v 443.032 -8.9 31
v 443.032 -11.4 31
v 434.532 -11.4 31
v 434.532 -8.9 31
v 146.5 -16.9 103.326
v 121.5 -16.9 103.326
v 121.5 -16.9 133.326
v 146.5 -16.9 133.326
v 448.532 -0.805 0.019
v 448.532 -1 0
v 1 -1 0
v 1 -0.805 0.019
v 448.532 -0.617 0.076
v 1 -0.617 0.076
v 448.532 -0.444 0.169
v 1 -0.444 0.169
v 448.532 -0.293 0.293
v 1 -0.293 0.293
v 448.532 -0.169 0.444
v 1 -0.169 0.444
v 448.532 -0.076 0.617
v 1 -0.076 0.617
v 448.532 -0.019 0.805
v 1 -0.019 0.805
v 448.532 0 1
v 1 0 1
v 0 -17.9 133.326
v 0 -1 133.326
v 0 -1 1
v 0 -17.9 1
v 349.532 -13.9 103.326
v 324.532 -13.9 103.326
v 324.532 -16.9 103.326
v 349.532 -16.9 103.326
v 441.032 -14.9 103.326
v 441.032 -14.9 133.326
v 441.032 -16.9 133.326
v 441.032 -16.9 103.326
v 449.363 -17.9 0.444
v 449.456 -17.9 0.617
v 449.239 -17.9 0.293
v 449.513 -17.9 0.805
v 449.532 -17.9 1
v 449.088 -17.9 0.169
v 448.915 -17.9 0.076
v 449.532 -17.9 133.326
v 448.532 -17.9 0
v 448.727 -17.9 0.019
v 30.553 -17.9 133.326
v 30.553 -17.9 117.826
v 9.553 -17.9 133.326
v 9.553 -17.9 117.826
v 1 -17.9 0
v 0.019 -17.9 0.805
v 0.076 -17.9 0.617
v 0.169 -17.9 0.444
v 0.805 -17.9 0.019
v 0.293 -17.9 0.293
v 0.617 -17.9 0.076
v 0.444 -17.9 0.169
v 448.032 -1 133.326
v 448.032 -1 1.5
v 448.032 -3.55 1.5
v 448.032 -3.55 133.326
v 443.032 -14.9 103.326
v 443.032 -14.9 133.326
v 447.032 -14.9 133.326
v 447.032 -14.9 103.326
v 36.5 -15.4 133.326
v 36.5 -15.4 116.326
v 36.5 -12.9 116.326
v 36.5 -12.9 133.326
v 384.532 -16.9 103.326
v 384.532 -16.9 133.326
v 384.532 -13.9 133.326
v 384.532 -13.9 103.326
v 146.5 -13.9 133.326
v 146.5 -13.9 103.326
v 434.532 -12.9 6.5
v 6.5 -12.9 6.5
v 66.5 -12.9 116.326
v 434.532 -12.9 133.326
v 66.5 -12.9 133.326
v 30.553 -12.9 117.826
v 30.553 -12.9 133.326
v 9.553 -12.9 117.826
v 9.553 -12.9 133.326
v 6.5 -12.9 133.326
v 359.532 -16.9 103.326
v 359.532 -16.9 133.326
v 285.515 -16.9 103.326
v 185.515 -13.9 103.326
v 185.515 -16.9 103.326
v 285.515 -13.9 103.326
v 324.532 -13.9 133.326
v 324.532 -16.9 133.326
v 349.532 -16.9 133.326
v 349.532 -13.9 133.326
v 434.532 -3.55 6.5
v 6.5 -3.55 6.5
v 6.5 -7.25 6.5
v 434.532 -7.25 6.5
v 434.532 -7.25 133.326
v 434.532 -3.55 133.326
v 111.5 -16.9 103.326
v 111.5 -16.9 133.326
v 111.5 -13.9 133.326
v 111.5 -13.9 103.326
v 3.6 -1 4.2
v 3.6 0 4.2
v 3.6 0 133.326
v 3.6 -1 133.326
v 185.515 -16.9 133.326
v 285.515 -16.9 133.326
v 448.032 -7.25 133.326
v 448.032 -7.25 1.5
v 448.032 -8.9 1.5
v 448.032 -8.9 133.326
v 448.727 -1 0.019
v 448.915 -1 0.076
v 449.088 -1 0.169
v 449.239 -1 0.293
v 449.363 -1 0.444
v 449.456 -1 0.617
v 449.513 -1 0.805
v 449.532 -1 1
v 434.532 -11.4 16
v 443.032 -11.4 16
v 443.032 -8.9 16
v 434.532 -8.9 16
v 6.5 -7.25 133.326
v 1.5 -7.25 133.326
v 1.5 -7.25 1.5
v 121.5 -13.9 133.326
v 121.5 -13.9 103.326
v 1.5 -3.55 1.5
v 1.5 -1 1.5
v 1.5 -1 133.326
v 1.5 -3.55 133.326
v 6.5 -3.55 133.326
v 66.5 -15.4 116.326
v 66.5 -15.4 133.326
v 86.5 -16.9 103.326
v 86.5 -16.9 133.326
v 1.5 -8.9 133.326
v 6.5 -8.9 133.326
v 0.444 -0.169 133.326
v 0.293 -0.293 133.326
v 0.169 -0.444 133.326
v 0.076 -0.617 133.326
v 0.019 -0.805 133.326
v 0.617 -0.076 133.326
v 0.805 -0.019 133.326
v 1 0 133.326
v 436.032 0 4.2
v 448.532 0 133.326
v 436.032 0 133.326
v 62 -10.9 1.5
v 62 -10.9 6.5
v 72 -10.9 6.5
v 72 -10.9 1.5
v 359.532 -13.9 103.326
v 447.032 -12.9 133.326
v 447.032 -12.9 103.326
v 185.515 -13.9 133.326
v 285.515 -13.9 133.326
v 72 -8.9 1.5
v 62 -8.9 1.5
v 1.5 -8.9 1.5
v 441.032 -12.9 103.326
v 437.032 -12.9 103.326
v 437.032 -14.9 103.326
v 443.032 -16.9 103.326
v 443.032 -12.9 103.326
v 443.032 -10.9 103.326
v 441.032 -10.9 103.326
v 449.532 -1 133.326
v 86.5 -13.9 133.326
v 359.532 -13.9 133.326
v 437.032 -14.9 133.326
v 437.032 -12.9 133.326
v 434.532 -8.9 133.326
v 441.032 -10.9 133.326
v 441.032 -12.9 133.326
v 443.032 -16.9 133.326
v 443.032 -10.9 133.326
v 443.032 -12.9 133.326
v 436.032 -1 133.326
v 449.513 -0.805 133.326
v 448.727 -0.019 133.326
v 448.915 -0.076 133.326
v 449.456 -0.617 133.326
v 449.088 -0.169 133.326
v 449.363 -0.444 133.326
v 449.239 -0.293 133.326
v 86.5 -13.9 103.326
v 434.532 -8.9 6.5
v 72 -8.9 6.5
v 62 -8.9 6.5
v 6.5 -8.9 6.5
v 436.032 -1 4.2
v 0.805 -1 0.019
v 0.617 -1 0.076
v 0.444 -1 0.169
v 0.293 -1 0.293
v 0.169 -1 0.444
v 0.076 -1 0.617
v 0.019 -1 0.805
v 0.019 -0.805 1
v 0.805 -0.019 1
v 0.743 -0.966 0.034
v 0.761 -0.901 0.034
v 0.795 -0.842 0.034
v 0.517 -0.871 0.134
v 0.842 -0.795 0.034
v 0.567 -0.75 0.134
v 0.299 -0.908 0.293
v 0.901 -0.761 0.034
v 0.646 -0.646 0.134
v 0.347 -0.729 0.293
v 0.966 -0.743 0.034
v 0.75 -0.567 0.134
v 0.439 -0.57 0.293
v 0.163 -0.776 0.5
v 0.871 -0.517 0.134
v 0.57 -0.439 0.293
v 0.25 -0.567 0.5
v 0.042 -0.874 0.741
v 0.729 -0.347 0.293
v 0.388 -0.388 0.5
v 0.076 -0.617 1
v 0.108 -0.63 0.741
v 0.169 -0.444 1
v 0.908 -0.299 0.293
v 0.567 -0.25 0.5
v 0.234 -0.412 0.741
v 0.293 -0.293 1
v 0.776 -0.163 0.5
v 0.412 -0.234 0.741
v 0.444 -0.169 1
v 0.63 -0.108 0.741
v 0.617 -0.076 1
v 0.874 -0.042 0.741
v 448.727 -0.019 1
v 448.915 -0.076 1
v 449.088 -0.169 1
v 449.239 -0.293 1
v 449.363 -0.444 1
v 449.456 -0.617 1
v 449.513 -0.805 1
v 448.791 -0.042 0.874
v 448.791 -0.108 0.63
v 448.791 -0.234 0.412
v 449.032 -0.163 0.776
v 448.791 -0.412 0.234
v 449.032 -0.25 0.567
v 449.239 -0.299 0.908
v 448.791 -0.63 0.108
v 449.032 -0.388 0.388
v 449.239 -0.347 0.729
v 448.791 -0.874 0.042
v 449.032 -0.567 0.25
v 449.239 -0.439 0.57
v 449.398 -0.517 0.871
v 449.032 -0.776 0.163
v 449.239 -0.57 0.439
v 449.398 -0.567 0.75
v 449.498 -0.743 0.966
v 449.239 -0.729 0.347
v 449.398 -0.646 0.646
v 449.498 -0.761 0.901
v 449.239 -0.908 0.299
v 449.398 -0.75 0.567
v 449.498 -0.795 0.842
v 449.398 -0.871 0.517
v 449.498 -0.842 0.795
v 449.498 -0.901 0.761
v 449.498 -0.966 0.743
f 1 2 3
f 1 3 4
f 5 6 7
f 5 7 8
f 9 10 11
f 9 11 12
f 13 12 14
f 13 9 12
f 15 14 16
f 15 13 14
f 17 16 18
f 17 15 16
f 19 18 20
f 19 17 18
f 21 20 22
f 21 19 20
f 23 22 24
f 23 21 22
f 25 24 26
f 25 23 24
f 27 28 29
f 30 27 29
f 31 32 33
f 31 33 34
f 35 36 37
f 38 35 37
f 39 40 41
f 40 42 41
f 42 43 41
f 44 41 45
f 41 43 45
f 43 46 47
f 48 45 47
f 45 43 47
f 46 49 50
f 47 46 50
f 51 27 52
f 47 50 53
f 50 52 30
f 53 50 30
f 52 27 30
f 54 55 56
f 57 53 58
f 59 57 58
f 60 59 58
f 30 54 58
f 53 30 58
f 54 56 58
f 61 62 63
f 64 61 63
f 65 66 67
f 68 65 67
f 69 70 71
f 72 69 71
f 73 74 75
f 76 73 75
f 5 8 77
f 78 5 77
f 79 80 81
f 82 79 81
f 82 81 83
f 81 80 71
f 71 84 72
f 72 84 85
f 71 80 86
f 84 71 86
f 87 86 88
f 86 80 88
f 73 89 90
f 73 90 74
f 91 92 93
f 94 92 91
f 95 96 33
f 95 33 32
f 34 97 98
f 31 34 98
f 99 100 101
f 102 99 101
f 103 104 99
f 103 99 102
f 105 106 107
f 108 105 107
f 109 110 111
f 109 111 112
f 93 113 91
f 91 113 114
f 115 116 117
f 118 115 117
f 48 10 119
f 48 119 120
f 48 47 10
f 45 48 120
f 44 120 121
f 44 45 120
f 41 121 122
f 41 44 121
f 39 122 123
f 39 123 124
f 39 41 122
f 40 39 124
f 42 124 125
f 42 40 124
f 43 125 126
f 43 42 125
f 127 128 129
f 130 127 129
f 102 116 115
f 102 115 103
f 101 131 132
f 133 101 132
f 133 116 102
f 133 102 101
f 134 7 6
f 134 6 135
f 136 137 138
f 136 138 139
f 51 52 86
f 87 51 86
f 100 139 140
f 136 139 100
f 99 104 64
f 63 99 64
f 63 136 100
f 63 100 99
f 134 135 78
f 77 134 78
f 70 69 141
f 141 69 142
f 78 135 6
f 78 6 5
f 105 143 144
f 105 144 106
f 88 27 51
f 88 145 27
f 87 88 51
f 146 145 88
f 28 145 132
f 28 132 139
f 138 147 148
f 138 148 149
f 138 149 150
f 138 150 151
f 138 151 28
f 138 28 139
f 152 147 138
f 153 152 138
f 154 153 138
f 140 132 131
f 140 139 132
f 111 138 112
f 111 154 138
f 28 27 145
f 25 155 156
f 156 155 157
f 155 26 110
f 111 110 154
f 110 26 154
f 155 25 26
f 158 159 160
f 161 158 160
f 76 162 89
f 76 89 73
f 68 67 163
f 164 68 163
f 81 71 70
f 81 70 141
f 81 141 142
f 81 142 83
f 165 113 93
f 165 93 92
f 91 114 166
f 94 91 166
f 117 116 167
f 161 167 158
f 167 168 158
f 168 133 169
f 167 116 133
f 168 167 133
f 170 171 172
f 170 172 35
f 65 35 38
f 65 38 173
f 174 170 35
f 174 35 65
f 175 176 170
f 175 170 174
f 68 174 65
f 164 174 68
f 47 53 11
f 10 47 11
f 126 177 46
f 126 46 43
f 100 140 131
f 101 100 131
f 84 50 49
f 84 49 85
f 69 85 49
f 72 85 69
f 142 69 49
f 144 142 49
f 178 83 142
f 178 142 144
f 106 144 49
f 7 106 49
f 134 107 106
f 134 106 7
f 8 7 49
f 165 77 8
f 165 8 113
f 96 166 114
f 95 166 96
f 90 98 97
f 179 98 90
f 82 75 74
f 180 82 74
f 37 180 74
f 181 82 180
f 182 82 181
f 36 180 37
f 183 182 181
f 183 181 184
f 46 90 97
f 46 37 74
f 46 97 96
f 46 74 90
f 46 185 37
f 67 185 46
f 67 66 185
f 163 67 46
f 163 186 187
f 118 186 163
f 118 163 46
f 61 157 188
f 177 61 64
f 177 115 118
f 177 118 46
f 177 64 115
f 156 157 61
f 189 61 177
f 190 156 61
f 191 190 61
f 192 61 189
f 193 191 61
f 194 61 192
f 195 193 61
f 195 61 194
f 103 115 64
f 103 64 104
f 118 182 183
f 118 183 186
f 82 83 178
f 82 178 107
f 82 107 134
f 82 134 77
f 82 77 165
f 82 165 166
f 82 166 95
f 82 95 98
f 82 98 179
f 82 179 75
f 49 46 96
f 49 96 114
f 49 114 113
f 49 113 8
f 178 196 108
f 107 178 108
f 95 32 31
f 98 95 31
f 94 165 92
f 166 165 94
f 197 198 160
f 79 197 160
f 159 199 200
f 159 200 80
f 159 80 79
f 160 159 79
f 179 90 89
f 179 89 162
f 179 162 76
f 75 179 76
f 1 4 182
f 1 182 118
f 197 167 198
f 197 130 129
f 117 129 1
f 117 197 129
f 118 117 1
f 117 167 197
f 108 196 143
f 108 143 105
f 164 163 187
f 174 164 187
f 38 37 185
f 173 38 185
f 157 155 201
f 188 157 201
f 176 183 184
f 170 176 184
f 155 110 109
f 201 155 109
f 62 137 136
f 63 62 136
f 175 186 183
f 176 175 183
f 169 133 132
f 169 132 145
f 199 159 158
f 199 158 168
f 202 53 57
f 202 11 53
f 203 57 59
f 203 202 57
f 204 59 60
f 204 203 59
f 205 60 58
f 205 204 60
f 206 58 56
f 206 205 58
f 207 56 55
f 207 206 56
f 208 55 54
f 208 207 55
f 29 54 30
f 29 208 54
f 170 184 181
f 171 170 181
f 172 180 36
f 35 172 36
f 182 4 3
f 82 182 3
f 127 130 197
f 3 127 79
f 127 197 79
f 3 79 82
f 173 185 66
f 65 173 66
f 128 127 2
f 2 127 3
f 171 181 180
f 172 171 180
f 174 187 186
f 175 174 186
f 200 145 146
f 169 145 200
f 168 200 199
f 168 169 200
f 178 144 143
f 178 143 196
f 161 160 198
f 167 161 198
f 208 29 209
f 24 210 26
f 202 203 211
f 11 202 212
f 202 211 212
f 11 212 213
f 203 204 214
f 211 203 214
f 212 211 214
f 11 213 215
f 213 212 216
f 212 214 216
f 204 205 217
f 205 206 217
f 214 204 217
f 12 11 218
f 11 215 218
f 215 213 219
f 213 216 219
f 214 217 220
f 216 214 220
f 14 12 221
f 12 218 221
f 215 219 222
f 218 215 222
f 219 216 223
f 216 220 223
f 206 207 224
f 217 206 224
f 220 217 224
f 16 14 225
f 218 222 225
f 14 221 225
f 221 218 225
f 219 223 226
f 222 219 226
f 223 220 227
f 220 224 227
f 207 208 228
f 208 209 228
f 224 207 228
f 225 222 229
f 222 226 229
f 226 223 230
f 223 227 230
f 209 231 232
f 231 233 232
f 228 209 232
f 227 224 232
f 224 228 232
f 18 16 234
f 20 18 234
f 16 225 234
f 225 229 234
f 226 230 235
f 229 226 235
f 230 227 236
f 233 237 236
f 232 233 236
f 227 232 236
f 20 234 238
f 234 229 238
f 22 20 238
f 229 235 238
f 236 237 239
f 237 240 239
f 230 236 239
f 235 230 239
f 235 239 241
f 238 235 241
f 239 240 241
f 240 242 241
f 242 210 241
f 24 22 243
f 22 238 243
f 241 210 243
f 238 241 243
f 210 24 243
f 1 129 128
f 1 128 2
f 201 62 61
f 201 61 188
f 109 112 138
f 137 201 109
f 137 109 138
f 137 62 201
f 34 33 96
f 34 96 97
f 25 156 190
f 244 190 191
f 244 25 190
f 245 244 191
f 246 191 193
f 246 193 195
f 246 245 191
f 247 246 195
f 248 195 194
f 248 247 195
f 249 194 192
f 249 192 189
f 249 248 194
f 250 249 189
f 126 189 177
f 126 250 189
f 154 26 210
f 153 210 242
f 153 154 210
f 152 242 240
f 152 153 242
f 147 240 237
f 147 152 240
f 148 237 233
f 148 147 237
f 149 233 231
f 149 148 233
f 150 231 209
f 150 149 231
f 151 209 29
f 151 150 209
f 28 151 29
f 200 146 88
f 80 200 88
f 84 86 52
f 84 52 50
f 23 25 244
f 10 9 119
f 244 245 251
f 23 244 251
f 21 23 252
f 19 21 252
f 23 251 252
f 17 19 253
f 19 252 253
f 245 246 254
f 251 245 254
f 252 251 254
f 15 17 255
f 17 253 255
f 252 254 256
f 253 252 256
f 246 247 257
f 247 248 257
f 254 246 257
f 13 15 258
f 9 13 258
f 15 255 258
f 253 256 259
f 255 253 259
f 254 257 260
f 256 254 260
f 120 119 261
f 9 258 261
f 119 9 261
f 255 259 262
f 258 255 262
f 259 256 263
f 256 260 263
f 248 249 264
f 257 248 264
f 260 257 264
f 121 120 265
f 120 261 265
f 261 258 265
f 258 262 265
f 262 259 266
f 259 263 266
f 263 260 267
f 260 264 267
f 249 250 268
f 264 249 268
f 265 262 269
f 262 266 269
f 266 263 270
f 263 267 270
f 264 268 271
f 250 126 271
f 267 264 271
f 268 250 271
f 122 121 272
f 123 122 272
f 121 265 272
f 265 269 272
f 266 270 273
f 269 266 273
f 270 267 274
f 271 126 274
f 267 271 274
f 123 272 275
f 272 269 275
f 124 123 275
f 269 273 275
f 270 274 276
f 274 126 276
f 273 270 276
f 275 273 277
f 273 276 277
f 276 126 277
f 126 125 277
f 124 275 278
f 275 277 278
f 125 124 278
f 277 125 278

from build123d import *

# Parameters (mm, degrees)
EXTRUDE_1_DEPTH     = 449.532
EXTRUDE_2_DEPTH     = 133.326
EXTRUDE_3_DEPTH     = 133.326
SKETCH_6_W          = 10
SKETCH_6_H          = 2
CUT_EXTRUDE_4_DEPTH = 5
SKETCH_7_W          = 15
SKETCH_7_H          = 2.5
CUT_EXTRUDE_5_DEPTH = 8.5
SKETCH_9_W          = 100
SKETCH_9_H          = 3
SKETCH_9_W_2        = 25
CUT_EXTRUDE_7_DEPTH = 30
SKETCH_10_W         = 21
SKETCH_10_H         = 5
CUT_EXTRUDE_8_DEPTH = 15.5
SKETCH_11_W         = 30
SKETCH_11_H         = 2.5
CUT_EXTRUDE_9_DEPTH = 17
FILLET_1_R          = 1
FILLET_2_R          = 1
FILLET_4_R          = 1


with BuildPart() as part:
    # 草图1 → 凸台-拉伸1 (new body)
    with BuildSketch(Plane(origin=(0, 0, 0), x_dir=(0, 0, -1), z_dir=(1, 0, 0))):
        Polygon((0, 0), (-4.2, 0), (-4.2, -1), (-1.5, -1), (-1.5, -3.55), (-6.5, -3.55), (-6.5, -7.25), (-1.5, -7.25), (-1.5, -8.9), (-6.5, -8.9), (-6.5, -12.9), (-133.326, -12.9), (-133.326, -17.9), (0, -17.9), align=None)
    extrude(amount=EXTRUDE_1_DEPTH)

    # 草图3 → 凸台-拉伸2 (add)
    with BuildSketch(Plane(origin=(0, 0, 0), x_dir=(-1, 0, 0), z_dir=(0, 0, -1))):
        Polygon((-449.532, 0), (-436.032, 0), (-436.032, -1), (-448.032, -1), (-448.032, -3.55), (-434.532, -3.55), (-434.532, -7.25), (-448.032, -7.25), (-448.032, -8.9), (-434.532, -8.9), (-434.532, -17.9), (-449.532, -17.9), align=None)
    extrude(amount=-EXTRUDE_2_DEPTH)

    # 草图4 → 凸台-拉伸3 (add)
    with BuildSketch(Plane(origin=(0, 0, 0), x_dir=(-1, 0, 0), z_dir=(0, 0, -1))):
        Polygon((0, 0), (-3.6, 0), (-3.6, -1), (-1.5, -1), (-1.5, -3.55), (-6.5, -3.55), (-6.5, -7.25), (-1.5, -7.25), (-1.5, -8.9), (-6.5, -8.9), (-6.5, -17.9), (0, -17.9), align=None)
    extrude(amount=-EXTRUDE_3_DEPTH)

    # 草图6 → 切除-拉伸4 (cut)
    with BuildSketch(Plane.XY.offset(6.5)):
        with Locations((67, -9.9)):
            Rectangle(SKETCH_6_W, SKETCH_6_H)
    extrude(amount=-CUT_EXTRUDE_4_DEPTH, mode=Mode.SUBTRACT)

    # 草图7 → 切除-拉伸5 (cut)
    with BuildSketch(Plane.ZY.offset(-434.532)):
        with Locations((23.5, -10.15)):
            Rectangle(SKETCH_7_W, SKETCH_7_H)
    extrude(amount=-CUT_EXTRUDE_5_DEPTH, mode=Mode.SUBTRACT)

    # 草图9 → 切除-拉伸7 (cut)
    with BuildSketch(Plane.XY.offset(133.326)):
        with Locations((235.515, -15.4)):
            Rectangle(SKETCH_9_W, SKETCH_9_H)
        with Locations((99, -15.4)):
            Rectangle(SKETCH_9_W_2, SKETCH_9_H)
        with Locations((337.032, -15.4)):
            Rectangle(SKETCH_9_W_2, SKETCH_9_H)
        with Locations((134, -15.4)):
            Rectangle(SKETCH_9_W_2, SKETCH_9_H)
        with Locations((372.032, -15.4)):
            Rectangle(SKETCH_9_W_2, SKETCH_9_H)
        Polygon((437.032, -12.9), (437.032, -14.9), (441.032, -14.9), (441.032, -16.9), (443.032, -16.9), (443.032, -14.9), (447.032, -14.9), (447.032, -12.9), (443.032, -12.9), (443.032, -10.9), (441.032, -10.9), (441.032, -12.9), align=None)
    extrude(amount=-CUT_EXTRUDE_7_DEPTH, mode=Mode.SUBTRACT)

    # 草图10 → 切除-拉伸8 (cut)
    with BuildSketch(Plane.XY.offset(133.326)):
        with Locations((20.053070751, -15.4)):
            Rectangle(SKETCH_10_W, SKETCH_10_H)
    extrude(amount=-CUT_EXTRUDE_8_DEPTH, mode=Mode.SUBTRACT)

    # 草图11 → 切除-拉伸9 (cut)
    with BuildSketch(Plane.XY.offset(133.326)):
        with Locations((51.5, -14.15)):
            Rectangle(SKETCH_11_W, SKETCH_11_H)
    extrude(amount=-CUT_EXTRUDE_9_DEPTH, mode=Mode.SUBTRACT)

    # 圆角1
    fillet_1_edges = [part.edges().sort_by_distance(p)[0] for p in [
        (0, 0, 66.663),
    ]]
    fillet(fillet_1_edges, radius=FILLET_1_R)

    # 圆角2
    fillet_2_edges = [part.edges().sort_by_distance(p)[0] for p in [
        (0, -9.45, 0),
        (225.266, 0, 0),
        (0.292893219, -0.292893219, 0),
    ]]
    fillet(fillet_2_edges, radius=FILLET_2_R)

    # 圆角4
    fillet_4_edges = [part.edges().sort_by_distance(p)[0] for p in [
        (449.532, 0, 67.163),
        (449.532, -0.292893219, 0.292893219),
        (449.532, -9.45, 0),
    ]]
    fillet(fillet_4_edges, radius=FILLET_4_R)


solid = part.part
